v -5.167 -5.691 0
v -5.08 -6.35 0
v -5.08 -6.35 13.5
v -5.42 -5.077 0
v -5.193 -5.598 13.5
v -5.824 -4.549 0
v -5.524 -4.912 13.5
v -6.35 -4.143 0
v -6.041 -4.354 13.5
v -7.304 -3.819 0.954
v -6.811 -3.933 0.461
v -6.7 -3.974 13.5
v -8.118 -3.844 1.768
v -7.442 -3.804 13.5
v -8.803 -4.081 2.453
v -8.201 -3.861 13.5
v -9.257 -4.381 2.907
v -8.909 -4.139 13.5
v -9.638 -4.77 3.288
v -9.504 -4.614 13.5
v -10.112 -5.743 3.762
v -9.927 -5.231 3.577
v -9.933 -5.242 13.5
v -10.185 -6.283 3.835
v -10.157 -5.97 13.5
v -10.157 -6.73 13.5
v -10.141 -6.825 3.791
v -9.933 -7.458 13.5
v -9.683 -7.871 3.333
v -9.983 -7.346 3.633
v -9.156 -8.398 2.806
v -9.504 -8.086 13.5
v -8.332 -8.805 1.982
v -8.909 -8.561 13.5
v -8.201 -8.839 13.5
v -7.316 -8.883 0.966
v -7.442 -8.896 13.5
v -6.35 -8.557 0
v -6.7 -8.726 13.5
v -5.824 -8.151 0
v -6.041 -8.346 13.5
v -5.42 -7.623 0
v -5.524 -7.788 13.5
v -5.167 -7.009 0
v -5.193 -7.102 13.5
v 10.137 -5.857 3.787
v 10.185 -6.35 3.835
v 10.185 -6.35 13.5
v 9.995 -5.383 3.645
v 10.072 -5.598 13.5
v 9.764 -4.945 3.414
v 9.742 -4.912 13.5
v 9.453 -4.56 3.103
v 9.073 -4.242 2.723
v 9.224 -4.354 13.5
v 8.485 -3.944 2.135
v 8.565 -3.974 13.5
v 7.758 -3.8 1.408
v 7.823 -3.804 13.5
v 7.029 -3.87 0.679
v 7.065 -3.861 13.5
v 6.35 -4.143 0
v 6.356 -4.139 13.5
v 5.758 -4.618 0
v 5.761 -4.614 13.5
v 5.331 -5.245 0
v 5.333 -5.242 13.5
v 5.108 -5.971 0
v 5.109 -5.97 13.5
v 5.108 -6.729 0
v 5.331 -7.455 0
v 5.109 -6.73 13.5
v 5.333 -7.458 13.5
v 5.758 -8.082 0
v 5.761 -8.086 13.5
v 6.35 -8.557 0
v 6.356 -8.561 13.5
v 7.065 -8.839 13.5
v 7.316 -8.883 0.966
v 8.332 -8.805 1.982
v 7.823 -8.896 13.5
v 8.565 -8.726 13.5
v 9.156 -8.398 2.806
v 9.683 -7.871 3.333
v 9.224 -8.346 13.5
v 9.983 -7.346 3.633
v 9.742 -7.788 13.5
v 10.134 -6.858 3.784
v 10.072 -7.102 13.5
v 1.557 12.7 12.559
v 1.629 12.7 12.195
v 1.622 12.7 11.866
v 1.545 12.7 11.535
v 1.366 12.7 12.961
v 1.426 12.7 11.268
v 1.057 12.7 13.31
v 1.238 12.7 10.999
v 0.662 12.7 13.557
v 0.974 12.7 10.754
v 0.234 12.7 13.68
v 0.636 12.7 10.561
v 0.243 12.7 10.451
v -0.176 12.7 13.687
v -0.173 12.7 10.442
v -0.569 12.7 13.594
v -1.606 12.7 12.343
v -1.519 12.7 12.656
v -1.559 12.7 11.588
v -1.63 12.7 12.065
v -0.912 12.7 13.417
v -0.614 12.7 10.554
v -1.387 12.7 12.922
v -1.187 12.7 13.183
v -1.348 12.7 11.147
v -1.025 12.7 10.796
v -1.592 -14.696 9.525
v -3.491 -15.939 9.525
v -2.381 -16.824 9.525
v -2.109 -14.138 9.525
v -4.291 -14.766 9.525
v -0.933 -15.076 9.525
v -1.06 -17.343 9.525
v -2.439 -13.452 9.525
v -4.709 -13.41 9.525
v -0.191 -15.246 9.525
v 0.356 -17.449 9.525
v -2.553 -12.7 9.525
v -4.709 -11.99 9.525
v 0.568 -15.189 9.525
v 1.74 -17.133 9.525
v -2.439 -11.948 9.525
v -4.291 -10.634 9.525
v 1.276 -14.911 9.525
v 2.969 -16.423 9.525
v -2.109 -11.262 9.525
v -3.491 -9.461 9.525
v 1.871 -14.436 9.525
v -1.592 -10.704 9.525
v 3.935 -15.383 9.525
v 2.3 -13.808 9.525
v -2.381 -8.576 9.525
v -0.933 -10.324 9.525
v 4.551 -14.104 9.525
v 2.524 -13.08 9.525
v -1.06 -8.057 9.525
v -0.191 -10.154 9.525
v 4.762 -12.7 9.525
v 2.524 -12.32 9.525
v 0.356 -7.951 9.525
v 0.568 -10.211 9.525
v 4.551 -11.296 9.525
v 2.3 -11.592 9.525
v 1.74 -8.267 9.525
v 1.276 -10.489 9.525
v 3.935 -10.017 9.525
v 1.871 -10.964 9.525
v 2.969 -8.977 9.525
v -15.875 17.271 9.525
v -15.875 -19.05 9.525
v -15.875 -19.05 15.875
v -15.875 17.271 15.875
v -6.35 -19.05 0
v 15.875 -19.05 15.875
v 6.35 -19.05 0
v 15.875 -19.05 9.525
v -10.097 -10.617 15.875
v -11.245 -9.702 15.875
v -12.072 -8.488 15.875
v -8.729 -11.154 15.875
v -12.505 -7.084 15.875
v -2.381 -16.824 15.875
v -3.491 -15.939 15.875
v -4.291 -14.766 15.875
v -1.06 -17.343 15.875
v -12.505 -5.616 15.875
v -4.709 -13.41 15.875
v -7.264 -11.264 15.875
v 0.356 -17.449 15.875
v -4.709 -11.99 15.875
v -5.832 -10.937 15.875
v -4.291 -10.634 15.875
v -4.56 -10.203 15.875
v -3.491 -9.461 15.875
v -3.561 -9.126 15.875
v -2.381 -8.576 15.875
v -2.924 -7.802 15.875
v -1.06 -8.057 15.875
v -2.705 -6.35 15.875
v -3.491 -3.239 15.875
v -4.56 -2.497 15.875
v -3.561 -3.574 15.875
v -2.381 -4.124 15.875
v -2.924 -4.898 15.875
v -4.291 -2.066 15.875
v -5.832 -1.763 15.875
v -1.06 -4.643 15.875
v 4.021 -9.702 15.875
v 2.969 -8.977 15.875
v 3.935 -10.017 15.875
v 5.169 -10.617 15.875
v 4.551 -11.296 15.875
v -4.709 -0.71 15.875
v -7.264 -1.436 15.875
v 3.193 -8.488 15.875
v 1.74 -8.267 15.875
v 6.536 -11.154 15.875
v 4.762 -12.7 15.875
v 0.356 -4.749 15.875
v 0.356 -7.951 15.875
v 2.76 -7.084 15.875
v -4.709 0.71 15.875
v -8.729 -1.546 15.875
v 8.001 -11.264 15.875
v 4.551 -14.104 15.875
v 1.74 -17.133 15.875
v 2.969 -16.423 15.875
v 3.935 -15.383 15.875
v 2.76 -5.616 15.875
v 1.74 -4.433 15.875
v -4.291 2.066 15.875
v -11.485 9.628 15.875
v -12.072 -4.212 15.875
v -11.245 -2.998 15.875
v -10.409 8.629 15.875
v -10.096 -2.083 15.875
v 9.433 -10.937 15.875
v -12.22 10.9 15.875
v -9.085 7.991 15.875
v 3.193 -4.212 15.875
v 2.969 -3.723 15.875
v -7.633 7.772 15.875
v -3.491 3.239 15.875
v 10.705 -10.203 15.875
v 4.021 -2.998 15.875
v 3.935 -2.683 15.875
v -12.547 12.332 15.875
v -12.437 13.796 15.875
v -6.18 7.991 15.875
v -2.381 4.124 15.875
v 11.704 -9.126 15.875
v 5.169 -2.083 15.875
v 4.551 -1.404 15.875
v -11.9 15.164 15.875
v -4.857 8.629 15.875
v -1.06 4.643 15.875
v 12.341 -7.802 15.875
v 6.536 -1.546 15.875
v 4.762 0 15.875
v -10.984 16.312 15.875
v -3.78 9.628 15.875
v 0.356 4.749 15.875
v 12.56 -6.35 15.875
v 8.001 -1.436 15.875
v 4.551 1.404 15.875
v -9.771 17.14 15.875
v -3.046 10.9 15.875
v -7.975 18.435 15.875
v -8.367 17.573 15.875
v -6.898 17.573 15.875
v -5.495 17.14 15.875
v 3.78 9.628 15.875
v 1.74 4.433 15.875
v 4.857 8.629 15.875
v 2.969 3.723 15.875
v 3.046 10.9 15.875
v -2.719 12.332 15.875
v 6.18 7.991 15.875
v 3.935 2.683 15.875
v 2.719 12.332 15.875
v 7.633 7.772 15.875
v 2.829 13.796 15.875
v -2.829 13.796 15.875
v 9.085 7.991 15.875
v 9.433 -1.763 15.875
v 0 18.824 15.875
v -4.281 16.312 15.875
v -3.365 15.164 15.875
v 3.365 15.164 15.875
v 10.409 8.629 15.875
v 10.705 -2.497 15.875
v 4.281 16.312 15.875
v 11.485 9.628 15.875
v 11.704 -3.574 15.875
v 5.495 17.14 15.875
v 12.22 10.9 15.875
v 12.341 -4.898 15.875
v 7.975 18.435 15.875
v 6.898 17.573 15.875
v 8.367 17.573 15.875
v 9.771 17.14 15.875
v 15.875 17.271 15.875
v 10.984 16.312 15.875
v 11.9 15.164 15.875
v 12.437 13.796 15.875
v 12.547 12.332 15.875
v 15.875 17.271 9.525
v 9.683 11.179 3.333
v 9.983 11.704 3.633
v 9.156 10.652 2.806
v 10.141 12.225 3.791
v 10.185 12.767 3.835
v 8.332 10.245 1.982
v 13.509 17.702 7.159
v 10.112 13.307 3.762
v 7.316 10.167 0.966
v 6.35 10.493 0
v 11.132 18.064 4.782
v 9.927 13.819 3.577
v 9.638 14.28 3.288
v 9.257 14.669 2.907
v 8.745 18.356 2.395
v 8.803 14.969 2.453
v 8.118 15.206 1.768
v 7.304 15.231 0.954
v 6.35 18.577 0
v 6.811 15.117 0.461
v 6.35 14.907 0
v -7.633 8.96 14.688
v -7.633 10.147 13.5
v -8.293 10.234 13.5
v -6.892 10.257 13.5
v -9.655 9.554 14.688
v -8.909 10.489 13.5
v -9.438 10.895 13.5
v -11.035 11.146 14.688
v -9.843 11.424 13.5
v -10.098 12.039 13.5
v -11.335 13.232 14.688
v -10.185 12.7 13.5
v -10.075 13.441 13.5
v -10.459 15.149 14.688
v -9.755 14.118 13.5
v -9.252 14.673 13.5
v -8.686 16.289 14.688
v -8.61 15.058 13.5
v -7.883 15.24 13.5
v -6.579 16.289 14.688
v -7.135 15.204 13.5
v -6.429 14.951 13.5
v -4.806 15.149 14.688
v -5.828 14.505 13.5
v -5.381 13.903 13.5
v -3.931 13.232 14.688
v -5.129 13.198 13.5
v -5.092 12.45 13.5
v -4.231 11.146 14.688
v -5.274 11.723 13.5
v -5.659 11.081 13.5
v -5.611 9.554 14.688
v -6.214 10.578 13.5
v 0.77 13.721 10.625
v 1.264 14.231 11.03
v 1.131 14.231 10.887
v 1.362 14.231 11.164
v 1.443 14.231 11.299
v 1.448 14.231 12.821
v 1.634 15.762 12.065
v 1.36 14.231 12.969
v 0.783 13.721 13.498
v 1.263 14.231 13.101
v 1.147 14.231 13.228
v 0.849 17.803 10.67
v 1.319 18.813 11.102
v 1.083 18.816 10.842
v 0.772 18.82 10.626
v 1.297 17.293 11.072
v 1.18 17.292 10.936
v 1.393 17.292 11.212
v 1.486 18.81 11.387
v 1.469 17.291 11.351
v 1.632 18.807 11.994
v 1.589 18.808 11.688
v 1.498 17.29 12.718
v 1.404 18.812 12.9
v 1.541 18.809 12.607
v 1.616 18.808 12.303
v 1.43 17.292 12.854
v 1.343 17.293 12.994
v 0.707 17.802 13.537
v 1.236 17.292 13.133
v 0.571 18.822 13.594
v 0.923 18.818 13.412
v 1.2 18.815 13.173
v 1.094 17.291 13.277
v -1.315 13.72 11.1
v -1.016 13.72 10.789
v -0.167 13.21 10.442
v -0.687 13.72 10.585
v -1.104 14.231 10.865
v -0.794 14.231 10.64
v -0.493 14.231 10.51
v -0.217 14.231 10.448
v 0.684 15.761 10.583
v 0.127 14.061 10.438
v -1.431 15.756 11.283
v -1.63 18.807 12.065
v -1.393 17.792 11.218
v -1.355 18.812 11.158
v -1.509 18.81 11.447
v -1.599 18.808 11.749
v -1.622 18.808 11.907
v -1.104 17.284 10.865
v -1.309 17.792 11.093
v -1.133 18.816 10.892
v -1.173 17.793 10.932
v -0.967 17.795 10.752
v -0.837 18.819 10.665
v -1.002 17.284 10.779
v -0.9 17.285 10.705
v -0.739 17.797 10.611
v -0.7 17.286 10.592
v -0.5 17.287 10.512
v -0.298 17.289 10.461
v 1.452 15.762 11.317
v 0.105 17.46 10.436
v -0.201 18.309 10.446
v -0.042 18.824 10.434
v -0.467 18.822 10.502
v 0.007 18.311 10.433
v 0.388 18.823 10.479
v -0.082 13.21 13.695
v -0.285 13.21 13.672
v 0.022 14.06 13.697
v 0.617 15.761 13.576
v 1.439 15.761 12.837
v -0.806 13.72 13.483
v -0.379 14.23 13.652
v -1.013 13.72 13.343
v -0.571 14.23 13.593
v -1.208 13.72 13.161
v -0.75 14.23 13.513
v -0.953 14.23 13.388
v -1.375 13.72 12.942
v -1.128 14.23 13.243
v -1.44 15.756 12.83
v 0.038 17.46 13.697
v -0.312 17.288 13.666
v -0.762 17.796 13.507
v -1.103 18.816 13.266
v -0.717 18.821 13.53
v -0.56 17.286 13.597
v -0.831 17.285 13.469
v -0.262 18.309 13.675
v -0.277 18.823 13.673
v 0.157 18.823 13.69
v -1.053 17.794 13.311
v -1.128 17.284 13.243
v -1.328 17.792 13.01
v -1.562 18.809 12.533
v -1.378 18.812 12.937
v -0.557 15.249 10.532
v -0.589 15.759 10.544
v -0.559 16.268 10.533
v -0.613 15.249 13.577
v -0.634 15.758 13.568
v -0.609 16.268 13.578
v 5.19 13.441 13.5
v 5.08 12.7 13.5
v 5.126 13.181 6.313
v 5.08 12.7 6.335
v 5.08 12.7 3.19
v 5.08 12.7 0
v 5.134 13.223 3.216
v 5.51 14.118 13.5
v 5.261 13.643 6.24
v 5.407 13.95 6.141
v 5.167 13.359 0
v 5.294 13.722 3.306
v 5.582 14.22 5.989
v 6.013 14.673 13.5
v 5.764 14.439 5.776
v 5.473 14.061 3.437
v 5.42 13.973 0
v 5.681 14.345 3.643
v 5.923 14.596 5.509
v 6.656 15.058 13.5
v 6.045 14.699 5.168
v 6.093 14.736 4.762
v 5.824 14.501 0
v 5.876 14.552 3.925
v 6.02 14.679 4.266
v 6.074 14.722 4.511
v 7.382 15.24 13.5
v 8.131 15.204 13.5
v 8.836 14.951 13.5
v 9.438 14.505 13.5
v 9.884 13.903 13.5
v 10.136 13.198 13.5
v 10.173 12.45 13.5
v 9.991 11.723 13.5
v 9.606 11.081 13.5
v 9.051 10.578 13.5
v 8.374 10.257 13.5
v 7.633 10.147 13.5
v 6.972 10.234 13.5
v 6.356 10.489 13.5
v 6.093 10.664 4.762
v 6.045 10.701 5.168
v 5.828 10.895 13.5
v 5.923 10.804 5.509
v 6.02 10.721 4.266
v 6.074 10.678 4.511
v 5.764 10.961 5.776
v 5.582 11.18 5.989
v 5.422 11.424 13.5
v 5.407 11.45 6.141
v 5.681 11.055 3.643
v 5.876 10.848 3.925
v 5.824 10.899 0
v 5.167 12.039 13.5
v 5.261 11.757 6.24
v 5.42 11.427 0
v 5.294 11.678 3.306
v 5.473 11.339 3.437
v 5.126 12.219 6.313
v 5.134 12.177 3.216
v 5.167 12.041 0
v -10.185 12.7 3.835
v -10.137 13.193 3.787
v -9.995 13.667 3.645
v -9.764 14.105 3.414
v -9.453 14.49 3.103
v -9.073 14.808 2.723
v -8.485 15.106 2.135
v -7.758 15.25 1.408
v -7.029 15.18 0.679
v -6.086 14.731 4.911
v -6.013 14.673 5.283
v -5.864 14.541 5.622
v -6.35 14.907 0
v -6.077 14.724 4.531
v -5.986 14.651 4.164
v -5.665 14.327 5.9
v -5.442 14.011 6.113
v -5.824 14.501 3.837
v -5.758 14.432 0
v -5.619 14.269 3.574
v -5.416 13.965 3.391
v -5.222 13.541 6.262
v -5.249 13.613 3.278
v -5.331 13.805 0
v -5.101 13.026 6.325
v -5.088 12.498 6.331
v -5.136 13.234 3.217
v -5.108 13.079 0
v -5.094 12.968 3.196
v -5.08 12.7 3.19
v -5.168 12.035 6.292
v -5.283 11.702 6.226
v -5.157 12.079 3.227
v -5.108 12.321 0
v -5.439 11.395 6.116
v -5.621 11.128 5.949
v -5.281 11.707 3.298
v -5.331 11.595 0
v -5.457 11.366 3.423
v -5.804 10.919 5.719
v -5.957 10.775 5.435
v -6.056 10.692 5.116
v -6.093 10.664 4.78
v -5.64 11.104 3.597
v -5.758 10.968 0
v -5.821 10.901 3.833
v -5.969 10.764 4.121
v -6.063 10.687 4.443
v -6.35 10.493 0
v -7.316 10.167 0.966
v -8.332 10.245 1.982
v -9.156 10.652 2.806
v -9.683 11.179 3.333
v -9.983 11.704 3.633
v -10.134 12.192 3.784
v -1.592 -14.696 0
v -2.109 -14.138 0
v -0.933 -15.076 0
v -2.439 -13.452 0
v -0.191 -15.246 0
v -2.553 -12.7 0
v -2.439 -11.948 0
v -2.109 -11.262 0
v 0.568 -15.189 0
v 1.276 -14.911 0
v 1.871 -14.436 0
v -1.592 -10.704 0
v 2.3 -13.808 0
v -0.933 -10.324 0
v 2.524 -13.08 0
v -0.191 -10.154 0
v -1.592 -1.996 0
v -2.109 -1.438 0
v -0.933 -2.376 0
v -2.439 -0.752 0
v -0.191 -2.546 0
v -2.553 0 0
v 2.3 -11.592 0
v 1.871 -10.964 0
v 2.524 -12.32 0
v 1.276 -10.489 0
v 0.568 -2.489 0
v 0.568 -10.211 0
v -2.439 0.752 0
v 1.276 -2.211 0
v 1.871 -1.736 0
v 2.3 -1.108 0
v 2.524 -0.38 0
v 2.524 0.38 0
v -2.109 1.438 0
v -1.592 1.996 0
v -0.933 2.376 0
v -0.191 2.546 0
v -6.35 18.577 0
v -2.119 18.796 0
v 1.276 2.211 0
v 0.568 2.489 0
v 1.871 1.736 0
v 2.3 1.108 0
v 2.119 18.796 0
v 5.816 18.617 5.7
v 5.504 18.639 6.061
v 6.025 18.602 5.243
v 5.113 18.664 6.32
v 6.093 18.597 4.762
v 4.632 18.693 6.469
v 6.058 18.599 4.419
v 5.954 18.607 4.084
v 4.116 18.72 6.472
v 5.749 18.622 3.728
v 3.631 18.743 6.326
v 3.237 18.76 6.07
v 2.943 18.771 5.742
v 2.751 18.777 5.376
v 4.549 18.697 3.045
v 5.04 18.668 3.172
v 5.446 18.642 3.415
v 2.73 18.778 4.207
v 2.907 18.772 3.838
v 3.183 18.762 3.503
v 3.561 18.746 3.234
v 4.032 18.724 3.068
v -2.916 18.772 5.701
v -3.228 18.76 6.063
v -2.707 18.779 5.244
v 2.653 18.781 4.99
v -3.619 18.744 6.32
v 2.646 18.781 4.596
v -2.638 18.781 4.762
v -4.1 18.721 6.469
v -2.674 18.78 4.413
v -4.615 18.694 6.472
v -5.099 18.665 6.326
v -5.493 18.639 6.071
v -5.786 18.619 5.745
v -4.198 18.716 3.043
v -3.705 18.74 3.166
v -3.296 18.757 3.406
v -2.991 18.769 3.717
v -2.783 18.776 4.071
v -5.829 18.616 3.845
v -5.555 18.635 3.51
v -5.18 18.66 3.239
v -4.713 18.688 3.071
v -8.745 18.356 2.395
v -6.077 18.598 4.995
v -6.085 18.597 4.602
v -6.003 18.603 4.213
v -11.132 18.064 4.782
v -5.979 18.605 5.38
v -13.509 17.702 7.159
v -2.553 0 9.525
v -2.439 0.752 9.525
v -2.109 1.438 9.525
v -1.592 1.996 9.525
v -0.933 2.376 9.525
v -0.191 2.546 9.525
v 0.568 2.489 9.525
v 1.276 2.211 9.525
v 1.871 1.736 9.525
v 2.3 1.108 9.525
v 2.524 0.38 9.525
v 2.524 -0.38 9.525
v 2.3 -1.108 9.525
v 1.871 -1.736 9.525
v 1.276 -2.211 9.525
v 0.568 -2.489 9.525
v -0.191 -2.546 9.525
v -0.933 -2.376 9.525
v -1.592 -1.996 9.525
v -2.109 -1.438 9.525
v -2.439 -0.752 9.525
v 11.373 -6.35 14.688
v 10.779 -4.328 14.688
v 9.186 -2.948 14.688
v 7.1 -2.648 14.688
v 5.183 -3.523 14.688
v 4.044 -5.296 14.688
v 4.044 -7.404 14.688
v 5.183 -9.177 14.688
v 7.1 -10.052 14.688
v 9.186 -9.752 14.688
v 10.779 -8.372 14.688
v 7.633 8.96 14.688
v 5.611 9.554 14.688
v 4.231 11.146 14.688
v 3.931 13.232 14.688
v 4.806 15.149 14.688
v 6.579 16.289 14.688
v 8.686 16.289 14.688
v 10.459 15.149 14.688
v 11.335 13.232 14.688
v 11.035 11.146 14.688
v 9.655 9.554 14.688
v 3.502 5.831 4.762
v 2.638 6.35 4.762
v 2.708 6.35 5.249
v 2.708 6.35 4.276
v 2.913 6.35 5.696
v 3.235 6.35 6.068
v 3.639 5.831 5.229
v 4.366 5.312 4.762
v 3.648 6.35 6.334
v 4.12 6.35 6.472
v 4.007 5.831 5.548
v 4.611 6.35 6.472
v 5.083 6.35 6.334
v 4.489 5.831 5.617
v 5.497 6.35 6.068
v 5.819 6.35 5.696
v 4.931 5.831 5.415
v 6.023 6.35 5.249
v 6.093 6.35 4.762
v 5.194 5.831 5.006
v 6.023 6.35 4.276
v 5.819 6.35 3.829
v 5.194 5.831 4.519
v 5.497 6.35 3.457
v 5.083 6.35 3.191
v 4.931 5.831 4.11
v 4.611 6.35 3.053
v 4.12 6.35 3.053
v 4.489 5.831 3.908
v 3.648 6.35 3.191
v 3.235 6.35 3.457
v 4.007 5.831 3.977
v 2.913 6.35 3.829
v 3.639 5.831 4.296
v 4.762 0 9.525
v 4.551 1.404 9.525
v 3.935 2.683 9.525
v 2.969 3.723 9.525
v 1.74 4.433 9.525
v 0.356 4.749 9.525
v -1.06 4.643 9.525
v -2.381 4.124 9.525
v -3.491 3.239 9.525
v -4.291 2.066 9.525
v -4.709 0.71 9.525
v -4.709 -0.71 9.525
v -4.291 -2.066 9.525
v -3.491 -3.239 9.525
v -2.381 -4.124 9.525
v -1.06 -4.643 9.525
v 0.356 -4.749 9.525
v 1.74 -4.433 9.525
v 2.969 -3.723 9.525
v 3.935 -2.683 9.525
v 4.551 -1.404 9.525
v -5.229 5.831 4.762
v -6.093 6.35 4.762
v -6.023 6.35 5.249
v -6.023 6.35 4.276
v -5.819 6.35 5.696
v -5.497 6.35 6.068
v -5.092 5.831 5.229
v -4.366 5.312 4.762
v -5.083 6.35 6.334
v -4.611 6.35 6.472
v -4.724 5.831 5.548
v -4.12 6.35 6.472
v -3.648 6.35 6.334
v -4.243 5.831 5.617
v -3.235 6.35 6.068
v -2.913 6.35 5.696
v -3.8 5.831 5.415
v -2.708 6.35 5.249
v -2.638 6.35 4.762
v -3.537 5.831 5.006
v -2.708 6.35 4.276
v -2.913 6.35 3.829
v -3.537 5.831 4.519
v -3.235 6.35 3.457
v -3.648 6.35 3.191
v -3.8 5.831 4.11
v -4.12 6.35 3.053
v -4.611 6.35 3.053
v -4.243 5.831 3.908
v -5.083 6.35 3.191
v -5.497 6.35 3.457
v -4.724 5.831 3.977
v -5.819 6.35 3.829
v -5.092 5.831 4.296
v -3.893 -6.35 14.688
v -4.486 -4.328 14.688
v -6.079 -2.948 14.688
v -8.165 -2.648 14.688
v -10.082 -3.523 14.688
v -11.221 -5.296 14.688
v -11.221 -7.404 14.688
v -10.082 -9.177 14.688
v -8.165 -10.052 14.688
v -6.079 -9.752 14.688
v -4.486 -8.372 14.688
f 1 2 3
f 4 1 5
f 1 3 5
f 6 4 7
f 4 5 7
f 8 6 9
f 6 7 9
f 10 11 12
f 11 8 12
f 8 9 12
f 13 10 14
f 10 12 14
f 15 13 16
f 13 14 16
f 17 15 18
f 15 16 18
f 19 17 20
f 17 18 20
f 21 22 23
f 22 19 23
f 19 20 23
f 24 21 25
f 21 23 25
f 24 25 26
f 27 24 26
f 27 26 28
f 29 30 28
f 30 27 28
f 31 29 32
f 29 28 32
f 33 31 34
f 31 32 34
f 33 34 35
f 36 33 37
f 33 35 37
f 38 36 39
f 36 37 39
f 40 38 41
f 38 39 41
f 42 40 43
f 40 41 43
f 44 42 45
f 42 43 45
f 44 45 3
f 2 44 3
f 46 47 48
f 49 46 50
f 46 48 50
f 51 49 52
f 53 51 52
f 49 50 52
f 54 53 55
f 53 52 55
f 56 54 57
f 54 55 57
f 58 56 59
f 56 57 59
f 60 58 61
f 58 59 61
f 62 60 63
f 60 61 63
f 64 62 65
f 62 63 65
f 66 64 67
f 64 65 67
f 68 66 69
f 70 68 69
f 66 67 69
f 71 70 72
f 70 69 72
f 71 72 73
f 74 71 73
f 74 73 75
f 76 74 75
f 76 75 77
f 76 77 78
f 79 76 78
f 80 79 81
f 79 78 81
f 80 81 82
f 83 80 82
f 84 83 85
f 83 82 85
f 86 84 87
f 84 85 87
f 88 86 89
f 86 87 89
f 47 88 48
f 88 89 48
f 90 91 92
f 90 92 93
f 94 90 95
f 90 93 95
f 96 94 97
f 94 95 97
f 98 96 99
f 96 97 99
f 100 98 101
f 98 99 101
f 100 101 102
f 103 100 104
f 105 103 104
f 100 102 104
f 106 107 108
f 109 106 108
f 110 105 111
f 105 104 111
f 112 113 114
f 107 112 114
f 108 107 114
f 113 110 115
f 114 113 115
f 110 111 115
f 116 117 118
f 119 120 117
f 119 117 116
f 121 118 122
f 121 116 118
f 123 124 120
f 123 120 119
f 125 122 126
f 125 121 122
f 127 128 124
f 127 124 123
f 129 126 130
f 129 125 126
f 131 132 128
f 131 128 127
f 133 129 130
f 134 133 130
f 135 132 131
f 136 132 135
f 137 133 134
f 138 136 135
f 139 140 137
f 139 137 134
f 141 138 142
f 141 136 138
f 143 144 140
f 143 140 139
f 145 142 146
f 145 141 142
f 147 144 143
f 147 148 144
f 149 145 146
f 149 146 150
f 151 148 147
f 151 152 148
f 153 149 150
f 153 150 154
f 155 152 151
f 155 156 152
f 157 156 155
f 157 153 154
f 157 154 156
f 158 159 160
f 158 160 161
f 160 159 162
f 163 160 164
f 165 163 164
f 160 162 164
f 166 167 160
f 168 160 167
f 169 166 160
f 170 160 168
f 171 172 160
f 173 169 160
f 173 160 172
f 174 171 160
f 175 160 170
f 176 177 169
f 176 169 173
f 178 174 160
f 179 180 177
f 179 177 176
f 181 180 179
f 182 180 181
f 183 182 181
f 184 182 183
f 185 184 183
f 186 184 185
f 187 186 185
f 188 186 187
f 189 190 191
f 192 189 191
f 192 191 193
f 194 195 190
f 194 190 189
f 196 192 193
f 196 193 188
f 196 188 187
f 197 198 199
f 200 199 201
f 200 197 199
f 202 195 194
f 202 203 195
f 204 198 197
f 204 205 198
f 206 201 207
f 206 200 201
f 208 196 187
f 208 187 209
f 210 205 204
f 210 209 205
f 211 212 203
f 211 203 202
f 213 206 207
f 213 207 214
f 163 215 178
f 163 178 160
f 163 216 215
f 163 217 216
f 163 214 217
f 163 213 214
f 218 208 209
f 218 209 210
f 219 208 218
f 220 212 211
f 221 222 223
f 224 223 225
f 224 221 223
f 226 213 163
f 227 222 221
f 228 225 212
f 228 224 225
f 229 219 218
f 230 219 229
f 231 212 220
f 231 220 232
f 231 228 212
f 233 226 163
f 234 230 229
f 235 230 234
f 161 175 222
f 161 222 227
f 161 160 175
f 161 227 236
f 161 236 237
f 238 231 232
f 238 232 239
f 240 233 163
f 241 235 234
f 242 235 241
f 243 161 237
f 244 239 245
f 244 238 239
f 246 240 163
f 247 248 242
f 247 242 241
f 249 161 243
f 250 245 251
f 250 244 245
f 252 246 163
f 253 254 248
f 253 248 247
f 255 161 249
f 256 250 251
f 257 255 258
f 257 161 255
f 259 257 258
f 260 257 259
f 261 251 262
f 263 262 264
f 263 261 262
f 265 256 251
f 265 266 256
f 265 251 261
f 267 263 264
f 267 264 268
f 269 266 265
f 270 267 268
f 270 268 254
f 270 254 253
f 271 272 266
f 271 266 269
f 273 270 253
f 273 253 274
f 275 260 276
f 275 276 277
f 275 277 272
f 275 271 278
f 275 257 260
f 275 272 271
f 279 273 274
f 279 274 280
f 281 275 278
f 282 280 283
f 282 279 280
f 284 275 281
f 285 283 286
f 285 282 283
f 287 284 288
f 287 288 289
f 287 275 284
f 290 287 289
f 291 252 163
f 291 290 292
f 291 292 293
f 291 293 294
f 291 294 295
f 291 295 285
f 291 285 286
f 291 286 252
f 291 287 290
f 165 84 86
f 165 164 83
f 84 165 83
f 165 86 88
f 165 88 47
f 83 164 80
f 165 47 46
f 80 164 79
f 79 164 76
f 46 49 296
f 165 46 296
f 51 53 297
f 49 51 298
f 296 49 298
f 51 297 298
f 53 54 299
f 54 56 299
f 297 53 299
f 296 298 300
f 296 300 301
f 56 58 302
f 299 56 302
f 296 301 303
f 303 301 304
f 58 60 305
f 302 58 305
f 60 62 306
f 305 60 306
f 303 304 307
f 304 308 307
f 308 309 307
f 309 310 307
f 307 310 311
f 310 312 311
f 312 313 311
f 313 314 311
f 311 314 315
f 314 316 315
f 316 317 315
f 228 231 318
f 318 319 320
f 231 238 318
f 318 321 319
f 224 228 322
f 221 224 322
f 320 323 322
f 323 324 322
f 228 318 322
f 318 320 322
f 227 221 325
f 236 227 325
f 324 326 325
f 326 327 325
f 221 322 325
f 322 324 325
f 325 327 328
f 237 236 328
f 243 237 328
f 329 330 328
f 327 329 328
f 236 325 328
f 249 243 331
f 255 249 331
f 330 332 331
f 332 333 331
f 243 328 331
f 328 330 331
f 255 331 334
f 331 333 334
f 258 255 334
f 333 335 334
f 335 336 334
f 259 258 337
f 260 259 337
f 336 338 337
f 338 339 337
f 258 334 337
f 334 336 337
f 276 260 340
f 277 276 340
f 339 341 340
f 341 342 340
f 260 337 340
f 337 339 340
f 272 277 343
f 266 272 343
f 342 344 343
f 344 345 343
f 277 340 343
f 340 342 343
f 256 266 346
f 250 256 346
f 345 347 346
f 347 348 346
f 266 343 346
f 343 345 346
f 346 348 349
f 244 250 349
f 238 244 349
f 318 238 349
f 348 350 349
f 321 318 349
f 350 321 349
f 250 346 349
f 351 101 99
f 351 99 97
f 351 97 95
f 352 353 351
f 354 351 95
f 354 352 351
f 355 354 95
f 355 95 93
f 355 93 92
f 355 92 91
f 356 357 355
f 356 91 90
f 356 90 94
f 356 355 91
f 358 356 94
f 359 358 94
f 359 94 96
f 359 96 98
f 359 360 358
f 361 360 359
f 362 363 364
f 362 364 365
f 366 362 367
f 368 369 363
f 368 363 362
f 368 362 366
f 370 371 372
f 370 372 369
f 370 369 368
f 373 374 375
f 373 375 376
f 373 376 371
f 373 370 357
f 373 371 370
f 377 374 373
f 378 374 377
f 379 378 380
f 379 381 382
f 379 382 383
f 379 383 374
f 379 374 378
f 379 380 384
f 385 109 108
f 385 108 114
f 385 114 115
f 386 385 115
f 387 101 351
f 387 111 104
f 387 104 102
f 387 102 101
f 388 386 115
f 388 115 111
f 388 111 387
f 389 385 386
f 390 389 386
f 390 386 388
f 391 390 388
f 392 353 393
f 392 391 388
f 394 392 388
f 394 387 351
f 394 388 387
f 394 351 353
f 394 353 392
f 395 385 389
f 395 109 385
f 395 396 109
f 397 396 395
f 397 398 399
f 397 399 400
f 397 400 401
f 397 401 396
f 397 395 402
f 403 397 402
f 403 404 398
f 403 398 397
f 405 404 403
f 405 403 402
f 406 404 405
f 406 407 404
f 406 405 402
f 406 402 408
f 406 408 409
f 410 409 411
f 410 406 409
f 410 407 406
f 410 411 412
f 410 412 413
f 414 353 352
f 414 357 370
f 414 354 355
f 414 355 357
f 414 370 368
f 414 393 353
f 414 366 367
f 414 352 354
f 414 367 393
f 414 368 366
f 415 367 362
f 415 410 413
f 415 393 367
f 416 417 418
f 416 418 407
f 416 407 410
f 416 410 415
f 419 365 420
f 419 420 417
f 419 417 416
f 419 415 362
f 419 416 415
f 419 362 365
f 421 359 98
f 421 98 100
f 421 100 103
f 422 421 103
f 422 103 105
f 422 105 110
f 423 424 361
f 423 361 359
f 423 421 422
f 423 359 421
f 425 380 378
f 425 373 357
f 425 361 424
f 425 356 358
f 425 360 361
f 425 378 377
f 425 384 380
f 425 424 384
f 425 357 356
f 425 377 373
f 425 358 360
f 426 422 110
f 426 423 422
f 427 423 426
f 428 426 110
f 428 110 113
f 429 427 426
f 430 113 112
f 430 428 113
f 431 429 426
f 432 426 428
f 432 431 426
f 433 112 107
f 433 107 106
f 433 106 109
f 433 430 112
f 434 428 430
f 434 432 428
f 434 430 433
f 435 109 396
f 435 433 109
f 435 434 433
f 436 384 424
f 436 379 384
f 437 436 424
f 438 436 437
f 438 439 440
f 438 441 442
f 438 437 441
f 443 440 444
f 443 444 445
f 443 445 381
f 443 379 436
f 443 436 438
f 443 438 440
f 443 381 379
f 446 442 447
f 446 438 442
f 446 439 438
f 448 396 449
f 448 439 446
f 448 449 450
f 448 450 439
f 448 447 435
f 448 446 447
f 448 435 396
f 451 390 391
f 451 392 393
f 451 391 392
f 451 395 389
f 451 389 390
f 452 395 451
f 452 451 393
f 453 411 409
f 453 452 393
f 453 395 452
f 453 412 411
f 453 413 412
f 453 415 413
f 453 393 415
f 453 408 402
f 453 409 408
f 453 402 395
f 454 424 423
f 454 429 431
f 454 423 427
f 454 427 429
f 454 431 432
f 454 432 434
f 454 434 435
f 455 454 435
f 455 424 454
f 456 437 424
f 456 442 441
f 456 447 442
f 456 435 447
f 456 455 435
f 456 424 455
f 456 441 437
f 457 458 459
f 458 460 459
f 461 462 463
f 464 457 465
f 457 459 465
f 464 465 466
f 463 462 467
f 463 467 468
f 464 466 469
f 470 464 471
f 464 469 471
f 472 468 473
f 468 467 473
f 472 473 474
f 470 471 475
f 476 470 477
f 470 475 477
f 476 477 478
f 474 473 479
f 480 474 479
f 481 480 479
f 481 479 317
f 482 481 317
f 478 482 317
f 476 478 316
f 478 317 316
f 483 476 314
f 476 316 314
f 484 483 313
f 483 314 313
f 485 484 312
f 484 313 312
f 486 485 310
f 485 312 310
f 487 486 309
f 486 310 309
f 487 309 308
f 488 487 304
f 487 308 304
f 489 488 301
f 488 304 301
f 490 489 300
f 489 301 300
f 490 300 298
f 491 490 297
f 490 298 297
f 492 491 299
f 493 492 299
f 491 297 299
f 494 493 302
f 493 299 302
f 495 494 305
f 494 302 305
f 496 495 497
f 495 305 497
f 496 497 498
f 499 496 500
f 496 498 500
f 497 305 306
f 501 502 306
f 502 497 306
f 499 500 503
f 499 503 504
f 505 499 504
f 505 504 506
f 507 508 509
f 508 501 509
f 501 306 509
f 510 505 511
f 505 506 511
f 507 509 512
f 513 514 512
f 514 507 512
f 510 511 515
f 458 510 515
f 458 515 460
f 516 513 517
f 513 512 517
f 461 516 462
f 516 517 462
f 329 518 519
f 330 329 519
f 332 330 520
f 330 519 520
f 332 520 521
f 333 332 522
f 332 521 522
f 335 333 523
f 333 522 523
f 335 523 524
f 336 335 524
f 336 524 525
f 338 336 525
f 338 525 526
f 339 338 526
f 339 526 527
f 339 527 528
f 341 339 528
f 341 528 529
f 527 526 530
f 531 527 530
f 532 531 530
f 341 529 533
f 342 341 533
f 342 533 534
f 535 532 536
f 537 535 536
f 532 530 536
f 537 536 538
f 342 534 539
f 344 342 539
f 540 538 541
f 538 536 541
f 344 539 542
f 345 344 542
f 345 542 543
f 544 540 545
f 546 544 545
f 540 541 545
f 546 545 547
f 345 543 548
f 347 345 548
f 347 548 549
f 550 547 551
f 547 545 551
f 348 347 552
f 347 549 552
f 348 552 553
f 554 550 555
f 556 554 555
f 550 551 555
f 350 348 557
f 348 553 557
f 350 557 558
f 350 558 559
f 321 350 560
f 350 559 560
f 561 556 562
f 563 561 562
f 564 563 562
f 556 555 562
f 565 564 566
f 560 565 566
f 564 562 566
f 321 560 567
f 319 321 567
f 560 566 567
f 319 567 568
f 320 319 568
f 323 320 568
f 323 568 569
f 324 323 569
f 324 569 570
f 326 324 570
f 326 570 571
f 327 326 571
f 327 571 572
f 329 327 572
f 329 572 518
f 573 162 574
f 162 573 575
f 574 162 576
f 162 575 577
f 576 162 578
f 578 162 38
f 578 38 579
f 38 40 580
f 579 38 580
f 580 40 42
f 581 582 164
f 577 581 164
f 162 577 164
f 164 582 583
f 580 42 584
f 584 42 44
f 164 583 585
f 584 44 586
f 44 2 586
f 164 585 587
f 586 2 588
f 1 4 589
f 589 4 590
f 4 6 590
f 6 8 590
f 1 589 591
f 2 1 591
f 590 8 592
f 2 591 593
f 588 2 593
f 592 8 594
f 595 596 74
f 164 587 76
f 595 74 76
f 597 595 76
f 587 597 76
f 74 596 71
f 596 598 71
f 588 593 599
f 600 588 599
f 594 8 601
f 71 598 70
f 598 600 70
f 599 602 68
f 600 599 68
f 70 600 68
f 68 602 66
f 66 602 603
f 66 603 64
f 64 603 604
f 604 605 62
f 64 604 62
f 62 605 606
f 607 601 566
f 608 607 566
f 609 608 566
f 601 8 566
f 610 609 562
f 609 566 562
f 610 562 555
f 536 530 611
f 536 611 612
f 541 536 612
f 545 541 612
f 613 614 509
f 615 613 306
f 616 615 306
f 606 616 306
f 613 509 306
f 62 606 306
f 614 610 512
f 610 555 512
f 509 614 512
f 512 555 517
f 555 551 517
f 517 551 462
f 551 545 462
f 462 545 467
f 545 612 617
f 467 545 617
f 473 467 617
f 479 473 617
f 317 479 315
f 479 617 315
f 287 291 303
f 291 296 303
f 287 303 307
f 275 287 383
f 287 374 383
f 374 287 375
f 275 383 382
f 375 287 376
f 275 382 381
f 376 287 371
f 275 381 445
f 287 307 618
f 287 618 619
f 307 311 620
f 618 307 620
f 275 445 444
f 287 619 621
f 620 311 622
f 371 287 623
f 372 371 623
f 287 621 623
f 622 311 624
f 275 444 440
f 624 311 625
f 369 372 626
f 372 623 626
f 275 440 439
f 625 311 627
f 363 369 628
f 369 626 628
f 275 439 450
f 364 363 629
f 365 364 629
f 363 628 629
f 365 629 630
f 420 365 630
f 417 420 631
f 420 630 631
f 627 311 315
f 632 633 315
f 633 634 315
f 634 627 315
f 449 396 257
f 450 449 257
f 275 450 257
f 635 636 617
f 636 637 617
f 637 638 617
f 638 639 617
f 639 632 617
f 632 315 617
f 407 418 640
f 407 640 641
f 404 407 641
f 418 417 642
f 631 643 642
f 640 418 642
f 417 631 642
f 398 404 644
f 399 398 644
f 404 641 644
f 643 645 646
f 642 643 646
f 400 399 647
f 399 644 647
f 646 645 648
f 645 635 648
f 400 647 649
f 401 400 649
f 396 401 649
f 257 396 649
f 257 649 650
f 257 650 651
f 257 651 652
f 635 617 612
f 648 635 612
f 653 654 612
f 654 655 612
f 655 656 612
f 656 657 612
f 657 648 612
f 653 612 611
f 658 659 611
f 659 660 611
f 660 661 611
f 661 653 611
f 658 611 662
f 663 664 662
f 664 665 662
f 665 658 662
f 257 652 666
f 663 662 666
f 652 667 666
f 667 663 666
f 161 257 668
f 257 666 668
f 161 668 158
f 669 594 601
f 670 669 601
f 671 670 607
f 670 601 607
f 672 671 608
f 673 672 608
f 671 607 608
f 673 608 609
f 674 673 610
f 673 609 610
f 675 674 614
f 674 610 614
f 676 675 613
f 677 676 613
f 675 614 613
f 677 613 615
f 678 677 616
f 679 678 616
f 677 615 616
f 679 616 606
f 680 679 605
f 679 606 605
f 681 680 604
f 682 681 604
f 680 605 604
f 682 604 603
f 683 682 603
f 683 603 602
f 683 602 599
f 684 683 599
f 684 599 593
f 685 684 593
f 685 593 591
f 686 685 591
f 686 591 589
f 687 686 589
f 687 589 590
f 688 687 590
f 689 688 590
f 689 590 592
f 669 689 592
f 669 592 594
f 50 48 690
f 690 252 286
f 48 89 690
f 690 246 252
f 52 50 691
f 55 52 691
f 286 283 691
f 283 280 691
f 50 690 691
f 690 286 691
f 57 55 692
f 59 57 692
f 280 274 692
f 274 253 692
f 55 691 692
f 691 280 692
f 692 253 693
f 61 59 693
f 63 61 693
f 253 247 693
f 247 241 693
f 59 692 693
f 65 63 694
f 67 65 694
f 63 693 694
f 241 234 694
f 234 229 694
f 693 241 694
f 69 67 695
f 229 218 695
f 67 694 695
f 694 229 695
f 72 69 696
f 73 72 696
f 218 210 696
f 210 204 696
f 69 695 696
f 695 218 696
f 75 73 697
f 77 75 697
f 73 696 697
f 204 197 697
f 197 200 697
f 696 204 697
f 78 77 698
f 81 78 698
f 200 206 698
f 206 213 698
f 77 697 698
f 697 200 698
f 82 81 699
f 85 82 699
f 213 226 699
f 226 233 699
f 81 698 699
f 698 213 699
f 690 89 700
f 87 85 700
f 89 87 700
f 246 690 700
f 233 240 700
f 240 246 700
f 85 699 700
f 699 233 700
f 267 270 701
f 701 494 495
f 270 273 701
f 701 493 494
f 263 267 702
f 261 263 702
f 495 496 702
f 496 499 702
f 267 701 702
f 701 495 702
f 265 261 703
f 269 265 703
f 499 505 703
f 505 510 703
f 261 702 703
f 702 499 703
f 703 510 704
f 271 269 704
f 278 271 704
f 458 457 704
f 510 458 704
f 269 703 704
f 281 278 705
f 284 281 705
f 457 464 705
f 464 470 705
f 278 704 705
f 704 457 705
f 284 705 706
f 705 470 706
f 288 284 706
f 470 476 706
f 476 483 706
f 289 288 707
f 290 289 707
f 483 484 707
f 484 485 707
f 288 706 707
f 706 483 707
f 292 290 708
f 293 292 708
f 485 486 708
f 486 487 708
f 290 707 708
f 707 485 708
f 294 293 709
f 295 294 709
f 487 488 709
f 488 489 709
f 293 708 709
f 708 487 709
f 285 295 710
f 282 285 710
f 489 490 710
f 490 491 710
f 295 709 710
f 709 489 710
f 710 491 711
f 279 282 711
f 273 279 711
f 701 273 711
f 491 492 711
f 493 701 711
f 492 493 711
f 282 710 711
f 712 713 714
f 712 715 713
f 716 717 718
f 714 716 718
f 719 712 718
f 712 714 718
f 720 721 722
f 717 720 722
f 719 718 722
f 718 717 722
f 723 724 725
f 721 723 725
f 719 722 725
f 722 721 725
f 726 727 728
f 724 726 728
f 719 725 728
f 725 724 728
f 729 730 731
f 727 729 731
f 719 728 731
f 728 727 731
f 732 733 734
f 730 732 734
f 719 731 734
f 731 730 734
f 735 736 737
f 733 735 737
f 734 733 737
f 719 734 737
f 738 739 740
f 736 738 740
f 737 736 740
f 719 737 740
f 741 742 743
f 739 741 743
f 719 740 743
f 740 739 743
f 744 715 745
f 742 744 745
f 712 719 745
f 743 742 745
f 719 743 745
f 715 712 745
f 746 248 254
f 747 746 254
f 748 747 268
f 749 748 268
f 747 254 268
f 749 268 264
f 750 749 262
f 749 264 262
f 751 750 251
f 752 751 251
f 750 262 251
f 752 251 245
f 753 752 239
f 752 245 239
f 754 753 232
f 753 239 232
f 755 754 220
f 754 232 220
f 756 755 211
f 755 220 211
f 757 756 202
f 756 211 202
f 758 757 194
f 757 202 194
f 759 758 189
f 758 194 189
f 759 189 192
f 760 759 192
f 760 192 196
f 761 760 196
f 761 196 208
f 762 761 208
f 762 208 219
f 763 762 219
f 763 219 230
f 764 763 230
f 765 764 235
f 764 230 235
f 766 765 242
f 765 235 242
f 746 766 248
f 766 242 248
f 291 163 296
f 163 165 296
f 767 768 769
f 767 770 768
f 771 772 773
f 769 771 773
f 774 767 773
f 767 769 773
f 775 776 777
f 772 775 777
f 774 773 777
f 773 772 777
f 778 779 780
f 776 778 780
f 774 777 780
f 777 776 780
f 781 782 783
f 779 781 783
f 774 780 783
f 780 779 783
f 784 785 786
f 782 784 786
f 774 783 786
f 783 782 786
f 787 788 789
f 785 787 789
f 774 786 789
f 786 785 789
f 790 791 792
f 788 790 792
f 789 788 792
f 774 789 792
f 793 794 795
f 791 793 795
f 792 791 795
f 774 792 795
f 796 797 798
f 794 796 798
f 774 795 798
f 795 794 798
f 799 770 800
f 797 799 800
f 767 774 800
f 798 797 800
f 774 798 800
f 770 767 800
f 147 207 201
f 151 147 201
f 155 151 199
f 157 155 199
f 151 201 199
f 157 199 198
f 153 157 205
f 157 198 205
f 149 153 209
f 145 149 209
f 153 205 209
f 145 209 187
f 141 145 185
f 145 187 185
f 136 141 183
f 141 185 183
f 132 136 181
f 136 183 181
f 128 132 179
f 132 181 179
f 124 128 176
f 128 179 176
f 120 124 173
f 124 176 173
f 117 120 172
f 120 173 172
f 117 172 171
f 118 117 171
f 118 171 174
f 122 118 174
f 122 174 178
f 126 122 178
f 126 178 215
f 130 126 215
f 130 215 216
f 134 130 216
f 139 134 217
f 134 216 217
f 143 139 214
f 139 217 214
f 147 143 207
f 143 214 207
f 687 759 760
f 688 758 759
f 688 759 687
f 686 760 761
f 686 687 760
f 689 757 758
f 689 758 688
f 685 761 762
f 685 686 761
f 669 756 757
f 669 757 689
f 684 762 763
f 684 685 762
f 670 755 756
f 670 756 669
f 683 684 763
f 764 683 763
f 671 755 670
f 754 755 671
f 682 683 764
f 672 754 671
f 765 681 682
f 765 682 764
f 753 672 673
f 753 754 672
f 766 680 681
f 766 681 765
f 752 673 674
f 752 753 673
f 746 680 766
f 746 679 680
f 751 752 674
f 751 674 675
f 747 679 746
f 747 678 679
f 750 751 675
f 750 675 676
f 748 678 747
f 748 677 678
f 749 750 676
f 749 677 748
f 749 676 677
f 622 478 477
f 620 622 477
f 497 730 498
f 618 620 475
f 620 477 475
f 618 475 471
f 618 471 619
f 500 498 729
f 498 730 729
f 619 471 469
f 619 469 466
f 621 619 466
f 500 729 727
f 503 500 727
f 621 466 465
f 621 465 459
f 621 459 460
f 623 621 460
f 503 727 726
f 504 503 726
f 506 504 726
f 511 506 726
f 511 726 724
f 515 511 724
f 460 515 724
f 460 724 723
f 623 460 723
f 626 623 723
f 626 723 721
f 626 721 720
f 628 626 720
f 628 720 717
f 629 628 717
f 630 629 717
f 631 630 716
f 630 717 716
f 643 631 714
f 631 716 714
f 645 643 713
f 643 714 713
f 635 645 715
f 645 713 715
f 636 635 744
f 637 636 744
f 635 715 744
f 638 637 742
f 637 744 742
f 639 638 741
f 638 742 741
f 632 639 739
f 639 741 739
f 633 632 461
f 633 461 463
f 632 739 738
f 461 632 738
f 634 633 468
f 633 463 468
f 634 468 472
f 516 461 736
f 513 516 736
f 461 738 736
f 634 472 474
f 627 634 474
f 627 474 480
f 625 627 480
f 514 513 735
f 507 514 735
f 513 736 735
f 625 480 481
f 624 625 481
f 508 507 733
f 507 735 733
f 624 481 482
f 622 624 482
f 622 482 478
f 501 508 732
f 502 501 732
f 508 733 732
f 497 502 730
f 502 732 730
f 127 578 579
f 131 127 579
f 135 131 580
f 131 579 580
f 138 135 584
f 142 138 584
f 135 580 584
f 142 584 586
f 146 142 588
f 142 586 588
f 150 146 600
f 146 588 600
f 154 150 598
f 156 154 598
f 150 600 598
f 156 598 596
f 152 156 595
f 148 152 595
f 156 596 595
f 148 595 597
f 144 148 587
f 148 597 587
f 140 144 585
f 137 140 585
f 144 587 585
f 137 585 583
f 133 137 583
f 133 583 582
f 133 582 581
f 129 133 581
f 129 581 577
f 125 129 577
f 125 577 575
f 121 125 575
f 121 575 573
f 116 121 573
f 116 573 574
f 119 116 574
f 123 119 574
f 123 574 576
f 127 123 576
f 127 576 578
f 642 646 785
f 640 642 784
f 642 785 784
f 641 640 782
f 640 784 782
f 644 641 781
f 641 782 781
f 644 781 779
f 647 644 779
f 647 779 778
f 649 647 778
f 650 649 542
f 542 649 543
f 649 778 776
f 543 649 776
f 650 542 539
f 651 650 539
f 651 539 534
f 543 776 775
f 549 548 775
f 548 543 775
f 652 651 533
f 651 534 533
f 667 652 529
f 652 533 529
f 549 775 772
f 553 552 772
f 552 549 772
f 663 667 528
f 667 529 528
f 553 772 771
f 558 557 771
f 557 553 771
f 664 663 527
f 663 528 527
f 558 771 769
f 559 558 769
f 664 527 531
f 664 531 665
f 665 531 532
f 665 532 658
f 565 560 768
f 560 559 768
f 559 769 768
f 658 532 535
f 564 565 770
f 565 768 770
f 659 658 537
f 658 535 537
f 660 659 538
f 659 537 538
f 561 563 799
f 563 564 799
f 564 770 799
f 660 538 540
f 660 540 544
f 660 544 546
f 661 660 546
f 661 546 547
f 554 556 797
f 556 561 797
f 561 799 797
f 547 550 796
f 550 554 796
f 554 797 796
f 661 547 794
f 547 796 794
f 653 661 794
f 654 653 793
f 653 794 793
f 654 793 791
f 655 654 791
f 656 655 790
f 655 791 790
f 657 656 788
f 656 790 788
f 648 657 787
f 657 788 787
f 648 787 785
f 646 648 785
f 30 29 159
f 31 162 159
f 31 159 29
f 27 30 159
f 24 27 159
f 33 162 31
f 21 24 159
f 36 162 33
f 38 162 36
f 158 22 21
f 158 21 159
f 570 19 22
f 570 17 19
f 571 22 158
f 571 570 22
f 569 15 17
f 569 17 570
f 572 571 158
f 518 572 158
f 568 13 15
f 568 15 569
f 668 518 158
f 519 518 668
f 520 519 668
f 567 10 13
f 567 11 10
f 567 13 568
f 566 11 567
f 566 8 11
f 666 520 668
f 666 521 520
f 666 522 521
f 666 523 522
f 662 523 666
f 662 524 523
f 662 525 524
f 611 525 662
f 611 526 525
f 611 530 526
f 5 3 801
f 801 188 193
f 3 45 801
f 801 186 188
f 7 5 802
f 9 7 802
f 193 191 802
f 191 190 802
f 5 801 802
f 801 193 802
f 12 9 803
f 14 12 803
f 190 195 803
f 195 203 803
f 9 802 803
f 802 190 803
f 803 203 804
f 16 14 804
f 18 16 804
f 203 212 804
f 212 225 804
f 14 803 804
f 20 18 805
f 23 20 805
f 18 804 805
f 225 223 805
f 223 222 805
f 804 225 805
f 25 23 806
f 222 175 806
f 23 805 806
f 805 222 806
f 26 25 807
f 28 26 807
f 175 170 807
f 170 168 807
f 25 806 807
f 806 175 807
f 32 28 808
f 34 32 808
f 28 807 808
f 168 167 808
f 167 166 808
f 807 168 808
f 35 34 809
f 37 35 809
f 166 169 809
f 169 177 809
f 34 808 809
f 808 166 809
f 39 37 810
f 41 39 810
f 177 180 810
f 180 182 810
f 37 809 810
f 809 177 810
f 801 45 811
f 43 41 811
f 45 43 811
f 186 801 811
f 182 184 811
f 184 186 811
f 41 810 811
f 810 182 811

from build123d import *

# Parameters (mm, degrees)
SKETCH1_W                    = 50.8
SKETCH1_H                    = 38.1
BOSS_EXTRUDE1_DEPTH          = 15.875
F_1_4_20_TAPPED_HOLE1_D      = 5.1054
CUT_EXTRUDE1_DEPTH           = 36.497579143
CUT_EXTRUDE1_DEPTH_BACK      = 36.497579143
SKETCH5_W                    = 73.284203365
SKETCH5_H                    = 114.763304797
CUT_EXTRUDE3_DEPTH           = 36.497579143
CUT_EXTRUDE3_DRAFT           = 45
CUT_EXTRUDE3_PROFILE_2_DEPTH = 36.497579143
CUT_EXTRUDE3_PROFILE_2_DRAFT = 45
CUT_EXTRUDE5_DEPTH           = 34.299680929
CUT_EXTRUDE5_DEPTH_BACK      = 34.299680929
SKETCH7_W                    = 138.535058429
SKETCH7_H                    = 124.054324336
SKETCH7_W_2                  = 31.75
SKETCH7_H_2                  = 70.377244636
F_1_4_20_TAPPED_HOLE2_D      = 5.1054
F_8_32_TAPPED_HOLE1_D        = 3.4544
F_8_32_TAPPED_HOLE1_DEPTH    = 12.7
F_8_32_TAPPED_HOLE1_TIP      = 1.037806461
CUT_EXTRUDE6_DEPTH           = 6.35
SKETCH14_R                   = 4.7625
CUT_EXTRUDE7_DEPTH           = 6.35


# Read off the part's stored shape, not the designer's step: LPattern1
with BuildPart() as part:
    # Sketch1 → Boss-Extrude1 (new body)
    with BuildSketch(Plane.XY):
        Rectangle(SKETCH1_W, SKETCH1_H)
    extrude(amount=BOSS_EXTRUDE1_DEPTH)

    # 1/4-20 Tapped Hole1 (through all)
    with Locations(Plane.XY.offset(15.875)):
        with Locations((7.6327, 12.7), (-7.6327, 12.7)):
            Hole(F_1_4_20_TAPPED_HOLE1_D / 2)

    # Sketch4 → Cut-Extrude1 (cut, two sides: drawn at the far end of the back side and taken through both)
    with BuildSketch(Plane.XY.offset(15.875).offset(-CUT_EXTRUDE1_DEPTH_BACK)):
        with BuildLine():
            Line((-39.282326984, 8.793789894), (-52.704404265, 33.364356416))
            Line((-52.704404265, 33.364356416), (0, 61.927684543))
            Line((0, 61.927684543), (62.667848215, 36.771765562))
            Line((62.667848215, 36.771765562), (48.5918884, 2.86093959))
            ThreePointArc((48.5918884, 2.86093959), (5.519661368, 18.637515941), (-39.282326984, 8.793789894))
        make_face()
    extrude(amount=CUT_EXTRUDE1_DEPTH + CUT_EXTRUDE1_DEPTH_BACK, mode=Mode.SUBTRACT)


with BuildPart() as cut_extrude3_tool:
    # Sketch5 → Cut-Extrude3 (with draft: the straight prism first)
    with BuildSketch(Plane.XY):
        with Locations((-42.992101682, 7.874882724)):
            Rectangle(SKETCH5_W, SKETCH5_H)
    extrude(amount=CUT_EXTRUDE3_DEPTH)
    # Cut-Extrude3: the draft: its side faces are tilted about the plane it starts from
    cut_extrude3_sides = [cut_extrude3_tool.faces().sort_by_distance(p)[0] for p in [
        (-42.992101682, 65.256535122, 18.248789571),
        (-79.634203365, 7.874882724, 18.248789571),
        (-42.992101682, -49.506769675, 18.248789571),
        (-6.35, 7.874882724, 18.248789571),
    ]]
    draft(cut_extrude3_sides, Plane.XY, CUT_EXTRUDE3_DRAFT)


with BuildPart() as part_1:
    add(part.part)

    # Cut-Extrude3: cut by cut_extrude3_tool
    add(cut_extrude3_tool.part, mode=Mode.SUBTRACT)


with BuildPart() as cut_extrude3_profile_2_tool:
    # Sketch5 → Cut-Extrude3 profile 2 (with draft: the straight prism first)
    with BuildSketch(Plane.XY):
        with Locations((42.992101682, 7.874882724)):
            Rectangle(SKETCH5_W, SKETCH5_H)
    extrude(amount=CUT_EXTRUDE3_PROFILE_2_DEPTH)
    # Cut-Extrude3 profile 2: the draft: its side faces are tilted about the plane it starts from
    cut_extrude3_profile_2_sides = [cut_extrude3_profile_2_tool.faces().sort_by_distance(p)[0] for p in [
        (42.992101682, 65.256535122, 18.248789571),
        (6.35, 7.874882724, 18.248789571),
        (42.992101682, -49.506769675, 18.248789571),
        (79.634203365, 7.874882724, 18.248789571),
    ]]
    draft(cut_extrude3_profile_2_sides, Plane.XY, CUT_EXTRUDE3_PROFILE_2_DRAFT)


with BuildPart() as part_2:
    add(part_1.part)

    # Cut-Extrude3 profile 2: cut by cut_extrude3_profile_2_tool
    add(cut_extrude3_profile_2_tool.part, mode=Mode.SUBTRACT)

    # Cut-Extrude4 cone 1 section (through the dimple's axis) → Cut-Extrude4 (revolve, cut)
    with BuildSketch(Plane(origin=(-7.6327, 12.7, 15.875), x_dir=(0, -1, 0), z_dir=(1, 0, 0))):
        Polygon((0, 0), (4.9276, 0), (0, 4.9276), align=None)
    revolve(axis=Axis((-7.6327, 12.7, 15.875), (0, 0, -1)), mode=Mode.SUBTRACT)

    # Cut-Extrude4 cone 2 section (through the dimple's axis) → Cut-Extrude4 cone 2 (revolve, cut)
    with BuildSketch(Plane(origin=(7.6327, 12.7, 15.875), x_dir=(0, -1, 0), z_dir=(1, 0, 0))):
        Polygon((0, 0), (4.9276, 0), (0, 4.9276), align=None)
    revolve(axis=Axis((7.6327, 12.7, 15.875), (0, 0, -1)), mode=Mode.SUBTRACT)

    # Sketch7 → Cut-Extrude5 (cut, two sides: drawn at the far end of the back side and taken through both)
    with BuildSketch(Plane.XY.offset(15.875).offset(-CUT_EXTRUDE5_DEPTH_BACK)):
        with Locations((-4.796027088, -12.18557991)):
            Rectangle(SKETCH7_W, SKETCH7_H)
        Rectangle(SKETCH7_W_2, SKETCH7_H_2, mode=Mode.SUBTRACT)
    extrude(amount=CUT_EXTRUDE5_DEPTH + CUT_EXTRUDE5_DEPTH_BACK, mode=Mode.SUBTRACT)

    # 1/4-20 Tapped Hole2 (through all)
    with Locations(Plane.XY.offset(15.875)):
        with Locations((0, -12.7), (0, 0)):
            Hole(F_1_4_20_TAPPED_HOLE2_D / 2)

    # #8-32 Tapped Hole1
    with Locations(Plane(origin=(0, 19.05, 0), x_dir=(-1, 0, 0), z_dir=(0, 1, 0))):
        with Locations((4.365625, 4.7625), (-4.365625, 4.7625)):
            Hole(F_8_32_TAPPED_HOLE1_D / 2, depth=F_8_32_TAPPED_HOLE1_DEPTH)
            with Locations((0, 0, -(F_8_32_TAPPED_HOLE1_DEPTH + F_8_32_TAPPED_HOLE1_TIP / 2))):  # 118° drill point
                Cone(0, F_8_32_TAPPED_HOLE1_D / 2, F_8_32_TAPPED_HOLE1_TIP, mode=Mode.SUBTRACT)

    # Sketch13 → Cut-Extrude6 (cut)
    with BuildSketch(Plane(origin=(0, 19.05, 0), x_dir=(-1, 0, 0), z_dir=(0, -1, 0))):
        with BuildLine():
            add(Edge.make_bspline(
                [(1.630169721, -12.065), (1.630169721, -8.8011), (-1.633730278, -8.8011), (-1.633730278, -12.065), (-1.633730278, -15.3289), (1.630169721, -15.3289), (1.630169721, -12.065)],
                knots=[0, 0, 0, 0, 0.5, 0.5, 0.5, 1, 1, 1, 1], degree=3, weights=[1, 0.333333333, 0.333333333, 1, 0.333333333, 0.333333333, 1]))
        make_face()
    extrude(amount=CUT_EXTRUDE6_DEPTH, mode=Mode.SUBTRACT)

    # LPattern1 outline → LPattern1 (revolve, cut)
    with BuildSketch(Plane(origin=(-7.6327, -6.35, 0), x_dir=(1, 0, 0), z_dir=(0, -1, 0))):
        Polygon((0, 0), (2.5527, 0), (2.5527, 13.5001), (4.9276, 15.875), (0, 15.875), align=None)
    revolve(axis=Axis((-7.6327, -6.35, 0), (0, 0, 1)), mode=Mode.SUBTRACT)

    # LPattern1 2 outline → LPattern1 2 (revolve, cut)
    with BuildSketch(Plane(origin=(7.6327, -6.35, 0), x_dir=(1, 0, 0), z_dir=(0, -1, 0))):
        Polygon((0, 0), (2.5527, 0), (2.5527, 13.5001), (4.9276, 15.875), (0, 15.875), align=None)
    revolve(axis=Axis((7.6327, -6.35, 0), (0, 0, 1)), mode=Mode.SUBTRACT)

    # Sketch14 → Cut-Extrude7 (cut)
    with BuildSketch(Plane.XY.offset(15.875)):
        Circle(SKETCH14_R)
        with Locations((0, -12.7)):
            Circle(SKETCH14_R)
    extrude(amount=-CUT_EXTRUDE7_DEPTH, mode=Mode.SUBTRACT)


solid = part_2.part
